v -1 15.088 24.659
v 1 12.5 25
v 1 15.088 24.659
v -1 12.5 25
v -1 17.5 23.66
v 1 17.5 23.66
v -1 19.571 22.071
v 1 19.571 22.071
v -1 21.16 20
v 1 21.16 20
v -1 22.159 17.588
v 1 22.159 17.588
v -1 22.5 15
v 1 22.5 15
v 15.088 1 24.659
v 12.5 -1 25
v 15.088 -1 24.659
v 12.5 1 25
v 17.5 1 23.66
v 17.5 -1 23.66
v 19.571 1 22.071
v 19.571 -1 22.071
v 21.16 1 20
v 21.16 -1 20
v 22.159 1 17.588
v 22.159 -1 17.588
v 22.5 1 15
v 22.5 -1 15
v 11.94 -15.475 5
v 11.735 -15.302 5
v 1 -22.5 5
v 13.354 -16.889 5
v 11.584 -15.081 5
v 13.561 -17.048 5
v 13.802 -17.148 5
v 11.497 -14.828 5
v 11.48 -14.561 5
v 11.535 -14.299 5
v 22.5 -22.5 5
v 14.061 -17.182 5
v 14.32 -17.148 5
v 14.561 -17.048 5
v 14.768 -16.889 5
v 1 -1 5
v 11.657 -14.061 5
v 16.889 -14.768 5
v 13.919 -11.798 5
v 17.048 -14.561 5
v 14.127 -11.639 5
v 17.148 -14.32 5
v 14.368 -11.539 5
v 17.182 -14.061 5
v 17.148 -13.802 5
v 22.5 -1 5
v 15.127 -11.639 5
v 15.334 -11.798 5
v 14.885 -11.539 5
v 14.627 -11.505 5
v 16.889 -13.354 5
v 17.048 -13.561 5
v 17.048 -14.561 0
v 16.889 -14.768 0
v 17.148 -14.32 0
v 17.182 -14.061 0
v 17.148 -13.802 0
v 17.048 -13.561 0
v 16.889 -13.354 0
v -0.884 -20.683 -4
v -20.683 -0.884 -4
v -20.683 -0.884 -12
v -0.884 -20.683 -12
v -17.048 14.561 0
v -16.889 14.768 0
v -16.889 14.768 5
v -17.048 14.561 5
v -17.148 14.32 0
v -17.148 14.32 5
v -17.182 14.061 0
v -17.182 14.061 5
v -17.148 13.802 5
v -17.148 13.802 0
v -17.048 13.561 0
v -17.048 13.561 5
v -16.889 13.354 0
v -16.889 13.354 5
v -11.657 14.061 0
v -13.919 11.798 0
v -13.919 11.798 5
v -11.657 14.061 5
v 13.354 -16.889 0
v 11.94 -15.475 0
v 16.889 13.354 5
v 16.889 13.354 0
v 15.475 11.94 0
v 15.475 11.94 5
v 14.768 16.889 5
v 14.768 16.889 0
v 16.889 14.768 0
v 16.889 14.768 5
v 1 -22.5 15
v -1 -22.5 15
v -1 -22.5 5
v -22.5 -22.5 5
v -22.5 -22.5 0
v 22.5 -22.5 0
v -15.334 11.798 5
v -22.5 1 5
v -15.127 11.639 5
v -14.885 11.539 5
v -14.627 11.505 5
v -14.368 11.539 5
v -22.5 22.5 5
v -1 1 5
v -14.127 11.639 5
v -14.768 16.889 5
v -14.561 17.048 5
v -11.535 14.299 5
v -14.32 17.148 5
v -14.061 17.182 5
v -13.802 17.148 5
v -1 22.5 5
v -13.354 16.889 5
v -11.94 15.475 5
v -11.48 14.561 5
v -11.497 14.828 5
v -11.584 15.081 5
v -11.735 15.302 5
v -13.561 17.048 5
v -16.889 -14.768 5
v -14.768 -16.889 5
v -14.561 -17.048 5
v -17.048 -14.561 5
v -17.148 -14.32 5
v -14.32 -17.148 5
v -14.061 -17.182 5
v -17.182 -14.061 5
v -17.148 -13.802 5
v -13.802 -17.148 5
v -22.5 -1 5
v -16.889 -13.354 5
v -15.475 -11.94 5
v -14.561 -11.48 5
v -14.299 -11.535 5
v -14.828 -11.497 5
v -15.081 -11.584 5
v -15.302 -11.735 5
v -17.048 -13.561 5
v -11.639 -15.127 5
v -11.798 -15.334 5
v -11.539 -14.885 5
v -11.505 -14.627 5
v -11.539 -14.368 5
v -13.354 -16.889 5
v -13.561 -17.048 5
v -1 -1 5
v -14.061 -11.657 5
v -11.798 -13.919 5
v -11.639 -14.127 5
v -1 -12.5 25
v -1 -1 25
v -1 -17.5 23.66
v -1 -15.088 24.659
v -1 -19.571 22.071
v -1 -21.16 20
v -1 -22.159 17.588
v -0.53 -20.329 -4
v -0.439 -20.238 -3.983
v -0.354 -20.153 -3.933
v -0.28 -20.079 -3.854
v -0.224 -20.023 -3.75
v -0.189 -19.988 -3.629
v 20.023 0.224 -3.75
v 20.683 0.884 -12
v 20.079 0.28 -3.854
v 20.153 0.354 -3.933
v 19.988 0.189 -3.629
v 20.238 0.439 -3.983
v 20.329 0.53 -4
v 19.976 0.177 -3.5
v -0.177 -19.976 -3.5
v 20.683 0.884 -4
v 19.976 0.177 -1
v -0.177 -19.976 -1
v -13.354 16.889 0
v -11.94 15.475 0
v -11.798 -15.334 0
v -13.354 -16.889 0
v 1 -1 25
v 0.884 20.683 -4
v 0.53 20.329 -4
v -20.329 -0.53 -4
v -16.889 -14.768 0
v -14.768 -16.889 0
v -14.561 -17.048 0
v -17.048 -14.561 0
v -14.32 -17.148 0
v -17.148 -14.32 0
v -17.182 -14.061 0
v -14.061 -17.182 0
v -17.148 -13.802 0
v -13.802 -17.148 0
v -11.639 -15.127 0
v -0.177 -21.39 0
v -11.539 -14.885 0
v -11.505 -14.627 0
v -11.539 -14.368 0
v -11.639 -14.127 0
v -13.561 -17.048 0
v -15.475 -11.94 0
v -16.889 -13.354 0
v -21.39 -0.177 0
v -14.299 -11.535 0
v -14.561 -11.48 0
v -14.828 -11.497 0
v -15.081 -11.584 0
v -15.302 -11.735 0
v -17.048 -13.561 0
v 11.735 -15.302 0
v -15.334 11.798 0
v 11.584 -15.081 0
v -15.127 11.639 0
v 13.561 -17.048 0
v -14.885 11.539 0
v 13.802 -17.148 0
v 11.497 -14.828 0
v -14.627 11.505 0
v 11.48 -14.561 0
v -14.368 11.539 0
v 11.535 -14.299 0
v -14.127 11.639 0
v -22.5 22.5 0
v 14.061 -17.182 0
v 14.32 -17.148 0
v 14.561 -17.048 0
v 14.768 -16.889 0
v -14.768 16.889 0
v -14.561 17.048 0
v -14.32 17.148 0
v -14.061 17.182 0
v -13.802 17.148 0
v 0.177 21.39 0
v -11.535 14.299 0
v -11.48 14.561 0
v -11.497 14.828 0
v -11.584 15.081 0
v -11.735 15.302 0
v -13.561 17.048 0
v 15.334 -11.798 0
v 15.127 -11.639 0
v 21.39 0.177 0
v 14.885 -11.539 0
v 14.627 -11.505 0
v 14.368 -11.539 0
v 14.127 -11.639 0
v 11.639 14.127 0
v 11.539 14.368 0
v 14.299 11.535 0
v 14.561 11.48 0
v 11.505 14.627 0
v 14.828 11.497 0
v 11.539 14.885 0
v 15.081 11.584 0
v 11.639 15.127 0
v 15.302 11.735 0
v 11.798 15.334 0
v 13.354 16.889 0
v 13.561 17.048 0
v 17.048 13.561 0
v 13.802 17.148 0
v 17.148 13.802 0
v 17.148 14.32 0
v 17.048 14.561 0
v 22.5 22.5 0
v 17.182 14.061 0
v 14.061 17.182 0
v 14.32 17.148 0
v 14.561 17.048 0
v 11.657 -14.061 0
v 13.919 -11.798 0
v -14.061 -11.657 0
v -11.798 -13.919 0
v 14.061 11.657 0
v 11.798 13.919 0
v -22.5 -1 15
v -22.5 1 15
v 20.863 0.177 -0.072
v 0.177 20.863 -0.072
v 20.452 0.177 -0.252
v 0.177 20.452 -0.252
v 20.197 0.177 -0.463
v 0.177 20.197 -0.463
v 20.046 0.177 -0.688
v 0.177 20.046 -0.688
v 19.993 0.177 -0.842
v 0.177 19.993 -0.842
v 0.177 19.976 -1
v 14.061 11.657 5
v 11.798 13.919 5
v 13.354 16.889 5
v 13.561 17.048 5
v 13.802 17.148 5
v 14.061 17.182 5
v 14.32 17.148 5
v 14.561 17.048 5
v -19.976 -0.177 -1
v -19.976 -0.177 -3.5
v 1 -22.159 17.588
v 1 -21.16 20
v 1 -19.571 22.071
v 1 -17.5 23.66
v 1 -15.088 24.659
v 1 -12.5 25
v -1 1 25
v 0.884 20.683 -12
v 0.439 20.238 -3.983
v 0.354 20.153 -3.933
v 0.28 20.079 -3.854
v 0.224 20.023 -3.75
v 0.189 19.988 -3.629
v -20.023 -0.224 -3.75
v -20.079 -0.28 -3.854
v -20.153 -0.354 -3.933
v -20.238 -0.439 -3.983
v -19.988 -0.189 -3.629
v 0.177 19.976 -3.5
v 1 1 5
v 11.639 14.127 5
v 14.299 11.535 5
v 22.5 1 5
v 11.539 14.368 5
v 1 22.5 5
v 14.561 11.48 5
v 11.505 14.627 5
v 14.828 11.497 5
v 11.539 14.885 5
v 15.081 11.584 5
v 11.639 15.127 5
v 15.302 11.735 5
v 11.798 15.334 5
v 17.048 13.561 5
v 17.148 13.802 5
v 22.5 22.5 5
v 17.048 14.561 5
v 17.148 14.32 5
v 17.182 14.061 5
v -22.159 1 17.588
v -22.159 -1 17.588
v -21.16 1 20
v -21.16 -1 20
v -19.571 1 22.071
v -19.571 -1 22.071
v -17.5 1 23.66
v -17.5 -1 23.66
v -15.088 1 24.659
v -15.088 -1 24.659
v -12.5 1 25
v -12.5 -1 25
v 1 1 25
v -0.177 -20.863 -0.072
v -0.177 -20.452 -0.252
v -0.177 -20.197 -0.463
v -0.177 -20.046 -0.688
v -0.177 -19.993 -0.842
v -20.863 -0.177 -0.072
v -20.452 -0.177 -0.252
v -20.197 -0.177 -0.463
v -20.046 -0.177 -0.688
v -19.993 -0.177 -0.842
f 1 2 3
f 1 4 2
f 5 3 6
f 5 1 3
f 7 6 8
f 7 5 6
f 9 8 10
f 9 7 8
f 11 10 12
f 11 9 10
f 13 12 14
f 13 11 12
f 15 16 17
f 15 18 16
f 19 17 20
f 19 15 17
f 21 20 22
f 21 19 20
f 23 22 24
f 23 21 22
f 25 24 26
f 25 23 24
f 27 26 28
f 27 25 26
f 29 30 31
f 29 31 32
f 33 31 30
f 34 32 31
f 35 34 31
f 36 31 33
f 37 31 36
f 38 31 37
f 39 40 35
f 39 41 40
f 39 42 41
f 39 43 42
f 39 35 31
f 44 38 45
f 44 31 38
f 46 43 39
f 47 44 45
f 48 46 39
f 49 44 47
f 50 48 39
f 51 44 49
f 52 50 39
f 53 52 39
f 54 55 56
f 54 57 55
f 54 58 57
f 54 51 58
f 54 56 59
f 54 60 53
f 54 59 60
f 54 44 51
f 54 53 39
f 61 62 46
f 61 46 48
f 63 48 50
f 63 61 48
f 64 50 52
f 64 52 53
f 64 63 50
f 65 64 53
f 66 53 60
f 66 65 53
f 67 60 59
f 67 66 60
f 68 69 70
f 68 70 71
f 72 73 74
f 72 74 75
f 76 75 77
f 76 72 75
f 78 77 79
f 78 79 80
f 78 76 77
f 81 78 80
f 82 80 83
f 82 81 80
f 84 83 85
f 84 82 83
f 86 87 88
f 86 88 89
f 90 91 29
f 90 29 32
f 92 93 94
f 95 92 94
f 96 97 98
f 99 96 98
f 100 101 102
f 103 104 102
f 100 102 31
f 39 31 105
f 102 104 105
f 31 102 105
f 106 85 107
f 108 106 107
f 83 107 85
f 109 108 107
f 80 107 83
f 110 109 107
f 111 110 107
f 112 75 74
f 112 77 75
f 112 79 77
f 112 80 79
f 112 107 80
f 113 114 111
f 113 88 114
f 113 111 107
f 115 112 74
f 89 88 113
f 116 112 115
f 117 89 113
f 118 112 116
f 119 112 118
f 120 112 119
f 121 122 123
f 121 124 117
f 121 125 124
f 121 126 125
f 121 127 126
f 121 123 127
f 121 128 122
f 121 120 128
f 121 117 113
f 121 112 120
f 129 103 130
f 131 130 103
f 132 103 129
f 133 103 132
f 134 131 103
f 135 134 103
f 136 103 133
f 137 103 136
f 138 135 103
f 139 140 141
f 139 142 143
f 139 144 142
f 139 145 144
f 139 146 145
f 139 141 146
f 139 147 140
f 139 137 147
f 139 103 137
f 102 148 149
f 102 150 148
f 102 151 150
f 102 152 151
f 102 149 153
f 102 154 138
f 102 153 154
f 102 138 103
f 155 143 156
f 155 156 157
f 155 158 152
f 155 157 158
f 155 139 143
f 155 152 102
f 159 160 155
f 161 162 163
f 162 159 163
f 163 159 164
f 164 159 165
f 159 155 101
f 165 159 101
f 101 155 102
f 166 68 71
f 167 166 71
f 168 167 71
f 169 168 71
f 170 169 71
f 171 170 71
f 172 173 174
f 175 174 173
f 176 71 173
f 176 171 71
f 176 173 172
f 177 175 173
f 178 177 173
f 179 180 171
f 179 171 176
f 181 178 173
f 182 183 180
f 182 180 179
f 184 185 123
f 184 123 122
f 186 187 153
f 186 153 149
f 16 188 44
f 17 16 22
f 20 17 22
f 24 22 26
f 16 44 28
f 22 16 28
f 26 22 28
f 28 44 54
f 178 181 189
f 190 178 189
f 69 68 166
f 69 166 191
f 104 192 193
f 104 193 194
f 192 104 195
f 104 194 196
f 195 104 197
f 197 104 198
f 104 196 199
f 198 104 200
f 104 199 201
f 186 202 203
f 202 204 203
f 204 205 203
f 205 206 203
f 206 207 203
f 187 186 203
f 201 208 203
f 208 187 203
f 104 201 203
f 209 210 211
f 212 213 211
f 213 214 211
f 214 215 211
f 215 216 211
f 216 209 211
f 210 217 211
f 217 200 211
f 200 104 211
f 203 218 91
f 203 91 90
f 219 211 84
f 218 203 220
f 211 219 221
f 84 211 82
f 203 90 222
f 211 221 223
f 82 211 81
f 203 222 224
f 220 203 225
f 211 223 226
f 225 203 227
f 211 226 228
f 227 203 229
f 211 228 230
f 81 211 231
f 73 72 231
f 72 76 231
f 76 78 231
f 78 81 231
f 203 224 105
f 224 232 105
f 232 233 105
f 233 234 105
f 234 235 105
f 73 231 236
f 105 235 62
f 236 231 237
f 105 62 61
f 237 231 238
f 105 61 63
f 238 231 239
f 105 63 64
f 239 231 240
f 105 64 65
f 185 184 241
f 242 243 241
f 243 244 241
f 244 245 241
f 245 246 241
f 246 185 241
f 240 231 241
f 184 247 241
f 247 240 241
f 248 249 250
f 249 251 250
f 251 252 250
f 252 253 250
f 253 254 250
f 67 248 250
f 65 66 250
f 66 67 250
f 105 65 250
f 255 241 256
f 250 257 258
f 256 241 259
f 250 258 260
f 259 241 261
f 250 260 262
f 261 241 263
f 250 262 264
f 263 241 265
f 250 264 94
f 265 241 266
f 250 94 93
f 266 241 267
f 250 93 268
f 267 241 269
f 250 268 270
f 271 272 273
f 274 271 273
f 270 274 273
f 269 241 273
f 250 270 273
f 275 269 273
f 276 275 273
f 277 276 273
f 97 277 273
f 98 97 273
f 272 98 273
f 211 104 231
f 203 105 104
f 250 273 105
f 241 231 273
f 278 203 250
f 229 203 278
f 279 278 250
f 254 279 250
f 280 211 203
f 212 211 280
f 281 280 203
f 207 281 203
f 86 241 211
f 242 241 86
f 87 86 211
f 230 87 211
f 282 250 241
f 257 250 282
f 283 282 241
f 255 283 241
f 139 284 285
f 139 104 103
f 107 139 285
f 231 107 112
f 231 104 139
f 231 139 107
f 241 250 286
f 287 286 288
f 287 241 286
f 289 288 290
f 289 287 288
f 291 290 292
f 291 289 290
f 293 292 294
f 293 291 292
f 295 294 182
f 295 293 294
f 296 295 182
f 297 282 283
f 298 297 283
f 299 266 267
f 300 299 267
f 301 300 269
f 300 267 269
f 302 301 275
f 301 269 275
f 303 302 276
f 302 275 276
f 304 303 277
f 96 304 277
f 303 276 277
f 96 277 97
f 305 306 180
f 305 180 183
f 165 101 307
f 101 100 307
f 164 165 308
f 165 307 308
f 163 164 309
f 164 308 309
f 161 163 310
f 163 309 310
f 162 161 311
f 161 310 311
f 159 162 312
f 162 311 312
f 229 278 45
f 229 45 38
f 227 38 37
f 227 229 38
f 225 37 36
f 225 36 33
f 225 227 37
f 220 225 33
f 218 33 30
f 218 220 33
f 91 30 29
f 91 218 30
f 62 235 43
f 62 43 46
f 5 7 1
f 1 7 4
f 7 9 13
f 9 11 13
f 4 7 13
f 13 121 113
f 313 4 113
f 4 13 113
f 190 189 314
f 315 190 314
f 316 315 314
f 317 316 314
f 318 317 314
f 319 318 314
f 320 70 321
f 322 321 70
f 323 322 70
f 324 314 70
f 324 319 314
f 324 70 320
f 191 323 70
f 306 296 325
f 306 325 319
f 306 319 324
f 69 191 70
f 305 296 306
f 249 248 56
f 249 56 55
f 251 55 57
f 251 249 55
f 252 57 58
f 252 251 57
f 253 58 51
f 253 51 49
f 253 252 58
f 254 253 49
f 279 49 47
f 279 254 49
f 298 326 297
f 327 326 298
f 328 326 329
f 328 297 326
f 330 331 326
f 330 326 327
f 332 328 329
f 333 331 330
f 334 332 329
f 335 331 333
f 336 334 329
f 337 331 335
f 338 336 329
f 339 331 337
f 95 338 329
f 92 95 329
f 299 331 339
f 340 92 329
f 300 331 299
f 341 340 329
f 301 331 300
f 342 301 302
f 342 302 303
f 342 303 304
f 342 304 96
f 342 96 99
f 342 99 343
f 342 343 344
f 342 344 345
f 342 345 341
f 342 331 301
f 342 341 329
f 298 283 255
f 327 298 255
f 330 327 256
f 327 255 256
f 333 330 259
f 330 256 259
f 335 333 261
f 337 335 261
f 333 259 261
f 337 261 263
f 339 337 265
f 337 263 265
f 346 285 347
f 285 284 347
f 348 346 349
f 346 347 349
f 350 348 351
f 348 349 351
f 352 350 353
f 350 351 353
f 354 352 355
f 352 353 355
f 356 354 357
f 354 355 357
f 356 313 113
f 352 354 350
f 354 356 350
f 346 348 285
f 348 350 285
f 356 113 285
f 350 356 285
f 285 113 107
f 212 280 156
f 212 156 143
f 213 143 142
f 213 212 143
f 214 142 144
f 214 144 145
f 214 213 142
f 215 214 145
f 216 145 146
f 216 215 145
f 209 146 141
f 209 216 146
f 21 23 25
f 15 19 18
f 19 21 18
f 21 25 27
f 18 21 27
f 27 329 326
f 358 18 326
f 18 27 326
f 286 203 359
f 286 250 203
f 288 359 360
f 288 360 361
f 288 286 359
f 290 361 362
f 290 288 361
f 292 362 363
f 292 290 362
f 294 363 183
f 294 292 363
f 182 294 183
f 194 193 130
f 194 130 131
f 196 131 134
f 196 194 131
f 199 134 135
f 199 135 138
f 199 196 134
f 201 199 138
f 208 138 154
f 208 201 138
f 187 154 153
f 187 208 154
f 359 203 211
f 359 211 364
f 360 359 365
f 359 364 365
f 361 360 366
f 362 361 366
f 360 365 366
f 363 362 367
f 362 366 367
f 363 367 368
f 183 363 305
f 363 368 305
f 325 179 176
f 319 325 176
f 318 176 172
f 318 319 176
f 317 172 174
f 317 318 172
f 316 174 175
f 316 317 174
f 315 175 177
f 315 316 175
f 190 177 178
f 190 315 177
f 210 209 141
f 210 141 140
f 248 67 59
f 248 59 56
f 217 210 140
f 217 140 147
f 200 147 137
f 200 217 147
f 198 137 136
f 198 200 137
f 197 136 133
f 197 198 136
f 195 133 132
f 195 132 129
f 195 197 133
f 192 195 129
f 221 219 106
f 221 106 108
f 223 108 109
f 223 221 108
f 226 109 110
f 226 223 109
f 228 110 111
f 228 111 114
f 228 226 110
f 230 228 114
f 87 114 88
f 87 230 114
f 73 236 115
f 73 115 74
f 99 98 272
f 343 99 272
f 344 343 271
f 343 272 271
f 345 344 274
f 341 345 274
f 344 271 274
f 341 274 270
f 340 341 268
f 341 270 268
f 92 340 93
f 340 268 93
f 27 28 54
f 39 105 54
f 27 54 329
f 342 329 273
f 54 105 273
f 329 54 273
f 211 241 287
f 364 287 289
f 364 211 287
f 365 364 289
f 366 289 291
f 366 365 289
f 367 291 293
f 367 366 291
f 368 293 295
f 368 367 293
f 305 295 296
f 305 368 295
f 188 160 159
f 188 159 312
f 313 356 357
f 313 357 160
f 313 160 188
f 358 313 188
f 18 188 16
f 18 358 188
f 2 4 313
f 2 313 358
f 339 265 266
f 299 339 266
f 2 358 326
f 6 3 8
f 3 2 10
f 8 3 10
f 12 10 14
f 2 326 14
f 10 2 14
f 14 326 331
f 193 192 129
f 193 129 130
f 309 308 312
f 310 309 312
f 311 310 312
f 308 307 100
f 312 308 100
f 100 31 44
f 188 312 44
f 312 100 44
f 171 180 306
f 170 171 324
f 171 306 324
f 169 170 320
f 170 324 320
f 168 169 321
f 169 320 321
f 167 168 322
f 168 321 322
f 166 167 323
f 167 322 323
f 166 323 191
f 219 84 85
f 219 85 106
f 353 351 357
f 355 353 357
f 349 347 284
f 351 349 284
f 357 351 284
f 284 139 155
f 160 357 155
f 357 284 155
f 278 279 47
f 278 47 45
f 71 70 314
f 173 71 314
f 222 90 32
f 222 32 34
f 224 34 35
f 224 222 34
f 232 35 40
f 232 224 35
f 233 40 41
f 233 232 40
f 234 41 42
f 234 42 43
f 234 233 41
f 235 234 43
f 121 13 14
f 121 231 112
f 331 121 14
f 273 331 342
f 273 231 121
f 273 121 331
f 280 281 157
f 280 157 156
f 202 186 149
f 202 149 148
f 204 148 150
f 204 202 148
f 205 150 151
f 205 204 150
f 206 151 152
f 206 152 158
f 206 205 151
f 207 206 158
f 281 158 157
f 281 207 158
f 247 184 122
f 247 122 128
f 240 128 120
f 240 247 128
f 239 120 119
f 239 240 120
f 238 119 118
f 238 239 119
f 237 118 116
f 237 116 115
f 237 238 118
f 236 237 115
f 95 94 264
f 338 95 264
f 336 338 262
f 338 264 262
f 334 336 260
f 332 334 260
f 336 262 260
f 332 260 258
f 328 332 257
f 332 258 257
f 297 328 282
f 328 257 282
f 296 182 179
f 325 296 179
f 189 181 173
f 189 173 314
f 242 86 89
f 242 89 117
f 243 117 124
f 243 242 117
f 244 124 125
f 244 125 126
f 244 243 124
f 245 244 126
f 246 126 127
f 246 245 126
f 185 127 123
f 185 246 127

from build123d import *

# Parameters (mm, degrees)
ESQUISSE1_W             = 45
ESQUISSE1_H             = 45
BOSS_EXTRU_1_DEPTH      = 5
BOSS_EXTRU_2_DEPTH      = 20
BOSS_EXTRU_3_DEPTH      = 12
CONG_1_R                = 10
ESQUISSE4_W             = 4
ESQUISSE4_H             = 31.383485478
ENL_V_MAT_EXTRU_1_DEPTH = 1
ESQUISSE6_W             = 4
ESQUISSE6_H             = 28.242544177
ENL_V_MAT_EXTRU_2_DEPTH = 1
CONG_2_R                = 1
CONG_3_R                = 0.5


with BuildPart() as part:
    # Esquisse1 → Boss.-Extru.1 (new body)
    with BuildSketch(Plane.XY):
        Rectangle(ESQUISSE1_W, ESQUISSE1_H)
        with BuildLine():
            Line((14.767944635, 16.889264979), (16.889264979, 14.767944635))
            ThreePointArc((16.889264979, 14.767944635), (17.182158197, 14.060837854), (16.889264979, 13.353731073))
            Line((16.889264979, 13.353731073), (15.475051416, 11.93951751))
            ThreePointArc((15.475051416, 11.93951751), (14.828187526, 11.496881699), (14.060837854, 11.656674798))
            Line((14.060837854, 11.656674798), (11.798096154, 13.919416498))
            ThreePointArc((11.798096154, 13.919416498), (11.505202935, 14.626523279), (11.798096154, 15.33363006))
            Line((11.798096154, 15.33363006), (13.353731073, 16.889264979))
            ThreePointArc((13.353731073, 16.889264979), (14.060837854, 17.182158197), (14.767944635, 16.889264979))
        make_face(mode=Mode.SUBTRACT)
        with BuildLine():
            Line((11.93951751, -15.475051416), (13.353731073, -16.889264979))
            ThreePointArc((13.353731073, -16.889264979), (14.060837854, -17.182158197), (14.767944635, -16.889264979))
            Line((14.767944635, -16.889264979), (16.889264979, -14.767944635))
            ThreePointArc((16.889264979, -14.767944635), (17.182158197, -14.060837854), (16.889264979, -13.353731073))
            Line((16.889264979, -13.353731073), (15.33363006, -11.798096154))
            ThreePointArc((15.33363006, -11.798096154), (14.626523279, -11.505202935), (13.919416498, -11.798096154))
            Line((13.919416498, -11.798096154), (11.656674798, -14.060837854))
            ThreePointArc((11.656674798, -14.060837854), (11.496881699, -14.828187526), (11.93951751, -15.475051416))
        make_face(mode=Mode.SUBTRACT)
        with BuildLine():
            Line((-15.475051416, -11.93951751), (-16.889264979, -13.353731073))
            ThreePointArc((-16.889264979, -13.353731073), (-17.182158197, -14.060837854), (-16.889264979, -14.767944635))
            Line((-16.889264979, -14.767944635), (-14.767944635, -16.889264979))
            ThreePointArc((-14.767944635, -16.889264979), (-14.060837854, -17.182158197), (-13.353731073, -16.889264979))
            Line((-13.353731073, -16.889264979), (-11.798096154, -15.33363006))
            ThreePointArc((-11.798096154, -15.33363006), (-11.505202935, -14.626523279), (-11.798096154, -13.919416498))
            Line((-11.798096154, -13.919416498), (-14.060837854, -11.656674798))
            ThreePointArc((-14.060837854, -11.656674798), (-14.828187526, -11.496881699), (-15.475051416, -11.93951751))
        make_face(mode=Mode.SUBTRACT)
        with BuildLine():
            Line((-11.93951751, 15.475051416), (-13.353731073, 16.889264979))
            ThreePointArc((-13.353731073, 16.889264979), (-14.060837854, 17.182158197), (-14.767944635, 16.889264979))
            Line((-14.767944635, 16.889264979), (-16.889264979, 14.767944635))
            ThreePointArc((-16.889264979, 14.767944635), (-17.182158197, 14.060837854), (-16.889264979, 13.353731073))
            Line((-16.889264979, 13.353731073), (-15.33363006, 11.798096154))
            ThreePointArc((-15.33363006, 11.798096154), (-14.626523279, 11.505202935), (-13.919416498, 11.798096154))
            Line((-13.919416498, 11.798096154), (-11.656674798, 14.060837854))
            ThreePointArc((-11.656674798, 14.060837854), (-11.496881699, 14.828187526), (-11.93951751, 15.475051416))
        make_face(mode=Mode.SUBTRACT)
    extrude(amount=BOSS_EXTRU_1_DEPTH)

    # Esquisse2 → Boss.-Extru.2 (add)
    with BuildSketch(Plane.XY.offset(5)):
        Polygon((-1, 22.5), (-1, 1), (-22.5, 1), (-22.5, -1), (-1, -1), (-1, -22.5), (1, -22.5), (1, -1), (22.5, -1), (22.5, 1), (1, 1), (1, 22.5), align=None)
    extrude(amount=BOSS_EXTRU_2_DEPTH)

    # Esquisse3 → Boss.-Extru.3 (add)
    with BuildSketch(Plane(origin=(0, 0, 0), x_dir=(-1, 0, 0), z_dir=(0, 0, -1))):
        Polygon((-20.68287335, 0.883883476), (-0.883883476, 20.68287335), (20.68287335, -0.883883476), (0.883883476, -20.68287335), align=None)
    extrude(amount=BOSS_EXTRU_3_DEPTH)

    # Congé1
    cong_1_edges = [part.edges().sort_by_distance(p)[0] for p in [
        (0, 22.5, 25),
        (-22.5, 0, 25),
        (0, -22.5, 25),
        (22.5, 0, 25),
    ]]
    fillet(cong_1_edges, radius=CONG_1_R)

    # Esquisse4 → Enlèv. mat.-Extru.1 (cut)
    with BuildSketch(Plane(origin=(10.783378413, 10.783378413, 0), x_dir=(0, 0, -1), z_dir=(0.7071067811865475, 0.7071067811865477, 0))):
        with Locations((2, -1.691742739)):
            Rectangle(ESQUISSE4_W, ESQUISSE4_H)
    extrude(amount=-ENL_V_MAT_EXTRU_1_DEPTH, mode=Mode.SUBTRACT)

    # Esquisse6 → Enlèv. mat.-Extru.2 (cut)
    with BuildSketch(Plane(origin=(-10.783378413, -10.783378413, 0), x_dir=(0, 0, 1), z_dir=(-0.7071067811865476, -0.7071067811865476, 0))):
        with Locations((-2, -0.121272089)):
            Rectangle(ESQUISSE6_W, ESQUISSE6_H)
    extrude(amount=-ENL_V_MAT_EXTRU_2_DEPTH, mode=Mode.SUBTRACT)

    # Congé2
    cong_2_edges = [part.edges().sort_by_distance(p)[0] for p in [
        (9.899494937, -9.899494937, 0),
        (10.076271632, 10.076271632, 0),
        (-9.899494937, 9.899494937, 0),
        (-10.076271632, -10.076271632, 0),
    ]]
    fillet(cong_2_edges, radius=CONG_2_R)

    # Congé3
    cong_3_edges = [part.edges().sort_by_distance(p)[0] for p in [
        (10.076271632, 10.076271632, -4),
        (-10.076271632, -10.076271632, -4),
    ]]
    fillet(cong_3_edges, radius=CONG_3_R)


solid = part.part
